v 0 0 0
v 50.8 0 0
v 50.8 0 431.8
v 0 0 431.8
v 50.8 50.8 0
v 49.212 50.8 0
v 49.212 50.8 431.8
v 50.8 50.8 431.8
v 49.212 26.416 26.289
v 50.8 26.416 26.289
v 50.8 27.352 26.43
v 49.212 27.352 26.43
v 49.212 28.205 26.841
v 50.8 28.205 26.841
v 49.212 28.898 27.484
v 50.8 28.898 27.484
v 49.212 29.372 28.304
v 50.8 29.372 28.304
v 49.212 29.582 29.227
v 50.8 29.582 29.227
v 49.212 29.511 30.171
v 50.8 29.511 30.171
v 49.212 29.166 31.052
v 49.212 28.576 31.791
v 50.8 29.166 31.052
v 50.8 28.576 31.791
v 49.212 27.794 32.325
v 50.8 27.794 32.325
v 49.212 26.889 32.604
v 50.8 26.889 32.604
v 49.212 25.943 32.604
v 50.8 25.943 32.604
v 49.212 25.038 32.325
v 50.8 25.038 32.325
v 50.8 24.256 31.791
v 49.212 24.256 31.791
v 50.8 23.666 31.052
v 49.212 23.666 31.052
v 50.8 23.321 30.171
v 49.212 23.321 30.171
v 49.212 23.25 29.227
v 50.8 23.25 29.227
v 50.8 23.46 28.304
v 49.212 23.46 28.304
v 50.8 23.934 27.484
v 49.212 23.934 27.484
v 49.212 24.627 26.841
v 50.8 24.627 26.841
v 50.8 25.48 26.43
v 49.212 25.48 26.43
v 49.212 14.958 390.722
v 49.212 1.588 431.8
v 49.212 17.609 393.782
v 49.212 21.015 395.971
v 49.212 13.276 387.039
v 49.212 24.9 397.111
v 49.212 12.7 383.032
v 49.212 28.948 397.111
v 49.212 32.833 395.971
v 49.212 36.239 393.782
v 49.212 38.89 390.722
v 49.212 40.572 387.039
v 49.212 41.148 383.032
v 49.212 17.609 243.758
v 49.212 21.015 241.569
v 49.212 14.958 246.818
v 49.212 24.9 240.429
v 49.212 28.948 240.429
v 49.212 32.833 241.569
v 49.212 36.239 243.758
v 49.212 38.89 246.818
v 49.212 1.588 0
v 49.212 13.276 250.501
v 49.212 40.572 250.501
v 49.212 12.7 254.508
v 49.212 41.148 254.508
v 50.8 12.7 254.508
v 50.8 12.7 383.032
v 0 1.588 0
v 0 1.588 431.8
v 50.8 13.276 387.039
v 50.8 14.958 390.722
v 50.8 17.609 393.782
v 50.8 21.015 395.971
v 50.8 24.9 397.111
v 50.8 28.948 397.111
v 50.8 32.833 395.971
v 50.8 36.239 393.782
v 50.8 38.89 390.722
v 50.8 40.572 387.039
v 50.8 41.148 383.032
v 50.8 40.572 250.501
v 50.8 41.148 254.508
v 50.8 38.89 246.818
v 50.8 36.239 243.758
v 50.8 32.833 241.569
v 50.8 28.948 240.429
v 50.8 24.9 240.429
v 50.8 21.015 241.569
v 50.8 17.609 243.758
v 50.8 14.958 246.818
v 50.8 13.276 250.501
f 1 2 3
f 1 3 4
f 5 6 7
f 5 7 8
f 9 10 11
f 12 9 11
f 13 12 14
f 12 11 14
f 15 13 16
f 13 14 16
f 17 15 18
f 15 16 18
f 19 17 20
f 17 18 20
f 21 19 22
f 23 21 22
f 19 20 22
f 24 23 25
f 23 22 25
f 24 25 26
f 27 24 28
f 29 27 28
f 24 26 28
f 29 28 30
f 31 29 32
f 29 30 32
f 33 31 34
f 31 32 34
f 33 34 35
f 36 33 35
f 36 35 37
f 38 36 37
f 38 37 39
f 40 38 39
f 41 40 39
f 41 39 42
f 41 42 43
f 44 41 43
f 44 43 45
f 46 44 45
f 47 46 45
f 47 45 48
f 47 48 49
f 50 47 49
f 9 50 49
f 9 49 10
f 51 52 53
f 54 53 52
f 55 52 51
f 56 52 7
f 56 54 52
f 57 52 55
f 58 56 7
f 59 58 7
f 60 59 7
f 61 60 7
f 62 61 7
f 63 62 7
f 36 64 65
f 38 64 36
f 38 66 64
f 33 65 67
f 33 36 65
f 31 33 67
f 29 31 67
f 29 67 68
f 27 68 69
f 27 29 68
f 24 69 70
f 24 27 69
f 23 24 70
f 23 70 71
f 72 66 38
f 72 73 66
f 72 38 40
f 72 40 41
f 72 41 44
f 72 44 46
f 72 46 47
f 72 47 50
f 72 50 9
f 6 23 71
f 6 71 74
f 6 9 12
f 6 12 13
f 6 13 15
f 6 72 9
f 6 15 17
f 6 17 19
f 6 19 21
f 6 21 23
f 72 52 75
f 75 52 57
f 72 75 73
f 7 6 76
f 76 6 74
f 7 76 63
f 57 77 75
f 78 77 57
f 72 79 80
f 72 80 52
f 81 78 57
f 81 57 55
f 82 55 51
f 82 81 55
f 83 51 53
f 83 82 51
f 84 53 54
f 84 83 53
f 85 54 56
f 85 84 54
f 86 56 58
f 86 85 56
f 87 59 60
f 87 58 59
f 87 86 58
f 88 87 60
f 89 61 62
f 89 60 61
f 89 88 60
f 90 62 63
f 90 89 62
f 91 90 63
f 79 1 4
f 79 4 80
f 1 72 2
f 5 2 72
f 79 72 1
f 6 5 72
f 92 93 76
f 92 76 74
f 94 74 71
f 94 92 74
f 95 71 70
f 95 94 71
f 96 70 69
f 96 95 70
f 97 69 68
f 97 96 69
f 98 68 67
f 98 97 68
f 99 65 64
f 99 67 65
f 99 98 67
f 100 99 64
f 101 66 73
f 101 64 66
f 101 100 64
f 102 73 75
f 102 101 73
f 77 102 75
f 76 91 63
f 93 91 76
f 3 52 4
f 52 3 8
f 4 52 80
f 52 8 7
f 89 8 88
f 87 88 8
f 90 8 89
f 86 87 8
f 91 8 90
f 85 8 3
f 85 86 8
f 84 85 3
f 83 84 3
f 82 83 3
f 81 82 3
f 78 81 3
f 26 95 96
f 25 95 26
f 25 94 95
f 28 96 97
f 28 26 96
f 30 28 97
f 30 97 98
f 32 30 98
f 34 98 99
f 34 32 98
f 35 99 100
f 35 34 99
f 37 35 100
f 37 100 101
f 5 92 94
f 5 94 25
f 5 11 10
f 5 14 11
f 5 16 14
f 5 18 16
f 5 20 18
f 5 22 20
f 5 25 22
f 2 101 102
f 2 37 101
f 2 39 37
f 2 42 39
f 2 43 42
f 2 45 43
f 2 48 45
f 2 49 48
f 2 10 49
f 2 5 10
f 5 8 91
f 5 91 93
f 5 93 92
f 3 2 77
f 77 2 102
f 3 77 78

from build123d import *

# Parameters (mm, degrees)
BOSS_EXTRUDE2_DEPTH = 431.8
SKETCH8_R           = 3.175
CUT_EXTRUDE6_DEPTH  = 2.54


with BuildPart() as part:
    # Sketch3 → Boss-Extrude2 (new body)
    with BuildSketch(Plane.XY):
        Polygon((0, 0), (0, 1.5875), (49.2125, 1.5875), (49.2125, 50.8), (50.8, 50.8), (50.8, 0), align=None)
    extrude(amount=BOSS_EXTRUDE2_DEPTH)

    # Sketch8 → Cut-Extrude6 (cut)
    with BuildSketch(Plane(origin=(50.8, 0, 0), x_dir=(0, 0, -1), z_dir=(1, 0, 0))):
        with Locations((-29.464, 26.416)):
            Circle(SKETCH8_R)
        with BuildLine():
            Line((-254.508, 12.7), (-383.032, 12.7))
            ThreePointArc((-383.032, 12.7), (-397.256, 26.924), (-383.032, 41.148))
            Line((-383.032, 41.148), (-254.508, 41.148))
            ThreePointArc((-254.508, 41.148), (-240.284, 26.924), (-254.508, 12.7))
        make_face()
    extrude(amount=-CUT_EXTRUDE6_DEPTH, mode=Mode.SUBTRACT)


solid = part.part
